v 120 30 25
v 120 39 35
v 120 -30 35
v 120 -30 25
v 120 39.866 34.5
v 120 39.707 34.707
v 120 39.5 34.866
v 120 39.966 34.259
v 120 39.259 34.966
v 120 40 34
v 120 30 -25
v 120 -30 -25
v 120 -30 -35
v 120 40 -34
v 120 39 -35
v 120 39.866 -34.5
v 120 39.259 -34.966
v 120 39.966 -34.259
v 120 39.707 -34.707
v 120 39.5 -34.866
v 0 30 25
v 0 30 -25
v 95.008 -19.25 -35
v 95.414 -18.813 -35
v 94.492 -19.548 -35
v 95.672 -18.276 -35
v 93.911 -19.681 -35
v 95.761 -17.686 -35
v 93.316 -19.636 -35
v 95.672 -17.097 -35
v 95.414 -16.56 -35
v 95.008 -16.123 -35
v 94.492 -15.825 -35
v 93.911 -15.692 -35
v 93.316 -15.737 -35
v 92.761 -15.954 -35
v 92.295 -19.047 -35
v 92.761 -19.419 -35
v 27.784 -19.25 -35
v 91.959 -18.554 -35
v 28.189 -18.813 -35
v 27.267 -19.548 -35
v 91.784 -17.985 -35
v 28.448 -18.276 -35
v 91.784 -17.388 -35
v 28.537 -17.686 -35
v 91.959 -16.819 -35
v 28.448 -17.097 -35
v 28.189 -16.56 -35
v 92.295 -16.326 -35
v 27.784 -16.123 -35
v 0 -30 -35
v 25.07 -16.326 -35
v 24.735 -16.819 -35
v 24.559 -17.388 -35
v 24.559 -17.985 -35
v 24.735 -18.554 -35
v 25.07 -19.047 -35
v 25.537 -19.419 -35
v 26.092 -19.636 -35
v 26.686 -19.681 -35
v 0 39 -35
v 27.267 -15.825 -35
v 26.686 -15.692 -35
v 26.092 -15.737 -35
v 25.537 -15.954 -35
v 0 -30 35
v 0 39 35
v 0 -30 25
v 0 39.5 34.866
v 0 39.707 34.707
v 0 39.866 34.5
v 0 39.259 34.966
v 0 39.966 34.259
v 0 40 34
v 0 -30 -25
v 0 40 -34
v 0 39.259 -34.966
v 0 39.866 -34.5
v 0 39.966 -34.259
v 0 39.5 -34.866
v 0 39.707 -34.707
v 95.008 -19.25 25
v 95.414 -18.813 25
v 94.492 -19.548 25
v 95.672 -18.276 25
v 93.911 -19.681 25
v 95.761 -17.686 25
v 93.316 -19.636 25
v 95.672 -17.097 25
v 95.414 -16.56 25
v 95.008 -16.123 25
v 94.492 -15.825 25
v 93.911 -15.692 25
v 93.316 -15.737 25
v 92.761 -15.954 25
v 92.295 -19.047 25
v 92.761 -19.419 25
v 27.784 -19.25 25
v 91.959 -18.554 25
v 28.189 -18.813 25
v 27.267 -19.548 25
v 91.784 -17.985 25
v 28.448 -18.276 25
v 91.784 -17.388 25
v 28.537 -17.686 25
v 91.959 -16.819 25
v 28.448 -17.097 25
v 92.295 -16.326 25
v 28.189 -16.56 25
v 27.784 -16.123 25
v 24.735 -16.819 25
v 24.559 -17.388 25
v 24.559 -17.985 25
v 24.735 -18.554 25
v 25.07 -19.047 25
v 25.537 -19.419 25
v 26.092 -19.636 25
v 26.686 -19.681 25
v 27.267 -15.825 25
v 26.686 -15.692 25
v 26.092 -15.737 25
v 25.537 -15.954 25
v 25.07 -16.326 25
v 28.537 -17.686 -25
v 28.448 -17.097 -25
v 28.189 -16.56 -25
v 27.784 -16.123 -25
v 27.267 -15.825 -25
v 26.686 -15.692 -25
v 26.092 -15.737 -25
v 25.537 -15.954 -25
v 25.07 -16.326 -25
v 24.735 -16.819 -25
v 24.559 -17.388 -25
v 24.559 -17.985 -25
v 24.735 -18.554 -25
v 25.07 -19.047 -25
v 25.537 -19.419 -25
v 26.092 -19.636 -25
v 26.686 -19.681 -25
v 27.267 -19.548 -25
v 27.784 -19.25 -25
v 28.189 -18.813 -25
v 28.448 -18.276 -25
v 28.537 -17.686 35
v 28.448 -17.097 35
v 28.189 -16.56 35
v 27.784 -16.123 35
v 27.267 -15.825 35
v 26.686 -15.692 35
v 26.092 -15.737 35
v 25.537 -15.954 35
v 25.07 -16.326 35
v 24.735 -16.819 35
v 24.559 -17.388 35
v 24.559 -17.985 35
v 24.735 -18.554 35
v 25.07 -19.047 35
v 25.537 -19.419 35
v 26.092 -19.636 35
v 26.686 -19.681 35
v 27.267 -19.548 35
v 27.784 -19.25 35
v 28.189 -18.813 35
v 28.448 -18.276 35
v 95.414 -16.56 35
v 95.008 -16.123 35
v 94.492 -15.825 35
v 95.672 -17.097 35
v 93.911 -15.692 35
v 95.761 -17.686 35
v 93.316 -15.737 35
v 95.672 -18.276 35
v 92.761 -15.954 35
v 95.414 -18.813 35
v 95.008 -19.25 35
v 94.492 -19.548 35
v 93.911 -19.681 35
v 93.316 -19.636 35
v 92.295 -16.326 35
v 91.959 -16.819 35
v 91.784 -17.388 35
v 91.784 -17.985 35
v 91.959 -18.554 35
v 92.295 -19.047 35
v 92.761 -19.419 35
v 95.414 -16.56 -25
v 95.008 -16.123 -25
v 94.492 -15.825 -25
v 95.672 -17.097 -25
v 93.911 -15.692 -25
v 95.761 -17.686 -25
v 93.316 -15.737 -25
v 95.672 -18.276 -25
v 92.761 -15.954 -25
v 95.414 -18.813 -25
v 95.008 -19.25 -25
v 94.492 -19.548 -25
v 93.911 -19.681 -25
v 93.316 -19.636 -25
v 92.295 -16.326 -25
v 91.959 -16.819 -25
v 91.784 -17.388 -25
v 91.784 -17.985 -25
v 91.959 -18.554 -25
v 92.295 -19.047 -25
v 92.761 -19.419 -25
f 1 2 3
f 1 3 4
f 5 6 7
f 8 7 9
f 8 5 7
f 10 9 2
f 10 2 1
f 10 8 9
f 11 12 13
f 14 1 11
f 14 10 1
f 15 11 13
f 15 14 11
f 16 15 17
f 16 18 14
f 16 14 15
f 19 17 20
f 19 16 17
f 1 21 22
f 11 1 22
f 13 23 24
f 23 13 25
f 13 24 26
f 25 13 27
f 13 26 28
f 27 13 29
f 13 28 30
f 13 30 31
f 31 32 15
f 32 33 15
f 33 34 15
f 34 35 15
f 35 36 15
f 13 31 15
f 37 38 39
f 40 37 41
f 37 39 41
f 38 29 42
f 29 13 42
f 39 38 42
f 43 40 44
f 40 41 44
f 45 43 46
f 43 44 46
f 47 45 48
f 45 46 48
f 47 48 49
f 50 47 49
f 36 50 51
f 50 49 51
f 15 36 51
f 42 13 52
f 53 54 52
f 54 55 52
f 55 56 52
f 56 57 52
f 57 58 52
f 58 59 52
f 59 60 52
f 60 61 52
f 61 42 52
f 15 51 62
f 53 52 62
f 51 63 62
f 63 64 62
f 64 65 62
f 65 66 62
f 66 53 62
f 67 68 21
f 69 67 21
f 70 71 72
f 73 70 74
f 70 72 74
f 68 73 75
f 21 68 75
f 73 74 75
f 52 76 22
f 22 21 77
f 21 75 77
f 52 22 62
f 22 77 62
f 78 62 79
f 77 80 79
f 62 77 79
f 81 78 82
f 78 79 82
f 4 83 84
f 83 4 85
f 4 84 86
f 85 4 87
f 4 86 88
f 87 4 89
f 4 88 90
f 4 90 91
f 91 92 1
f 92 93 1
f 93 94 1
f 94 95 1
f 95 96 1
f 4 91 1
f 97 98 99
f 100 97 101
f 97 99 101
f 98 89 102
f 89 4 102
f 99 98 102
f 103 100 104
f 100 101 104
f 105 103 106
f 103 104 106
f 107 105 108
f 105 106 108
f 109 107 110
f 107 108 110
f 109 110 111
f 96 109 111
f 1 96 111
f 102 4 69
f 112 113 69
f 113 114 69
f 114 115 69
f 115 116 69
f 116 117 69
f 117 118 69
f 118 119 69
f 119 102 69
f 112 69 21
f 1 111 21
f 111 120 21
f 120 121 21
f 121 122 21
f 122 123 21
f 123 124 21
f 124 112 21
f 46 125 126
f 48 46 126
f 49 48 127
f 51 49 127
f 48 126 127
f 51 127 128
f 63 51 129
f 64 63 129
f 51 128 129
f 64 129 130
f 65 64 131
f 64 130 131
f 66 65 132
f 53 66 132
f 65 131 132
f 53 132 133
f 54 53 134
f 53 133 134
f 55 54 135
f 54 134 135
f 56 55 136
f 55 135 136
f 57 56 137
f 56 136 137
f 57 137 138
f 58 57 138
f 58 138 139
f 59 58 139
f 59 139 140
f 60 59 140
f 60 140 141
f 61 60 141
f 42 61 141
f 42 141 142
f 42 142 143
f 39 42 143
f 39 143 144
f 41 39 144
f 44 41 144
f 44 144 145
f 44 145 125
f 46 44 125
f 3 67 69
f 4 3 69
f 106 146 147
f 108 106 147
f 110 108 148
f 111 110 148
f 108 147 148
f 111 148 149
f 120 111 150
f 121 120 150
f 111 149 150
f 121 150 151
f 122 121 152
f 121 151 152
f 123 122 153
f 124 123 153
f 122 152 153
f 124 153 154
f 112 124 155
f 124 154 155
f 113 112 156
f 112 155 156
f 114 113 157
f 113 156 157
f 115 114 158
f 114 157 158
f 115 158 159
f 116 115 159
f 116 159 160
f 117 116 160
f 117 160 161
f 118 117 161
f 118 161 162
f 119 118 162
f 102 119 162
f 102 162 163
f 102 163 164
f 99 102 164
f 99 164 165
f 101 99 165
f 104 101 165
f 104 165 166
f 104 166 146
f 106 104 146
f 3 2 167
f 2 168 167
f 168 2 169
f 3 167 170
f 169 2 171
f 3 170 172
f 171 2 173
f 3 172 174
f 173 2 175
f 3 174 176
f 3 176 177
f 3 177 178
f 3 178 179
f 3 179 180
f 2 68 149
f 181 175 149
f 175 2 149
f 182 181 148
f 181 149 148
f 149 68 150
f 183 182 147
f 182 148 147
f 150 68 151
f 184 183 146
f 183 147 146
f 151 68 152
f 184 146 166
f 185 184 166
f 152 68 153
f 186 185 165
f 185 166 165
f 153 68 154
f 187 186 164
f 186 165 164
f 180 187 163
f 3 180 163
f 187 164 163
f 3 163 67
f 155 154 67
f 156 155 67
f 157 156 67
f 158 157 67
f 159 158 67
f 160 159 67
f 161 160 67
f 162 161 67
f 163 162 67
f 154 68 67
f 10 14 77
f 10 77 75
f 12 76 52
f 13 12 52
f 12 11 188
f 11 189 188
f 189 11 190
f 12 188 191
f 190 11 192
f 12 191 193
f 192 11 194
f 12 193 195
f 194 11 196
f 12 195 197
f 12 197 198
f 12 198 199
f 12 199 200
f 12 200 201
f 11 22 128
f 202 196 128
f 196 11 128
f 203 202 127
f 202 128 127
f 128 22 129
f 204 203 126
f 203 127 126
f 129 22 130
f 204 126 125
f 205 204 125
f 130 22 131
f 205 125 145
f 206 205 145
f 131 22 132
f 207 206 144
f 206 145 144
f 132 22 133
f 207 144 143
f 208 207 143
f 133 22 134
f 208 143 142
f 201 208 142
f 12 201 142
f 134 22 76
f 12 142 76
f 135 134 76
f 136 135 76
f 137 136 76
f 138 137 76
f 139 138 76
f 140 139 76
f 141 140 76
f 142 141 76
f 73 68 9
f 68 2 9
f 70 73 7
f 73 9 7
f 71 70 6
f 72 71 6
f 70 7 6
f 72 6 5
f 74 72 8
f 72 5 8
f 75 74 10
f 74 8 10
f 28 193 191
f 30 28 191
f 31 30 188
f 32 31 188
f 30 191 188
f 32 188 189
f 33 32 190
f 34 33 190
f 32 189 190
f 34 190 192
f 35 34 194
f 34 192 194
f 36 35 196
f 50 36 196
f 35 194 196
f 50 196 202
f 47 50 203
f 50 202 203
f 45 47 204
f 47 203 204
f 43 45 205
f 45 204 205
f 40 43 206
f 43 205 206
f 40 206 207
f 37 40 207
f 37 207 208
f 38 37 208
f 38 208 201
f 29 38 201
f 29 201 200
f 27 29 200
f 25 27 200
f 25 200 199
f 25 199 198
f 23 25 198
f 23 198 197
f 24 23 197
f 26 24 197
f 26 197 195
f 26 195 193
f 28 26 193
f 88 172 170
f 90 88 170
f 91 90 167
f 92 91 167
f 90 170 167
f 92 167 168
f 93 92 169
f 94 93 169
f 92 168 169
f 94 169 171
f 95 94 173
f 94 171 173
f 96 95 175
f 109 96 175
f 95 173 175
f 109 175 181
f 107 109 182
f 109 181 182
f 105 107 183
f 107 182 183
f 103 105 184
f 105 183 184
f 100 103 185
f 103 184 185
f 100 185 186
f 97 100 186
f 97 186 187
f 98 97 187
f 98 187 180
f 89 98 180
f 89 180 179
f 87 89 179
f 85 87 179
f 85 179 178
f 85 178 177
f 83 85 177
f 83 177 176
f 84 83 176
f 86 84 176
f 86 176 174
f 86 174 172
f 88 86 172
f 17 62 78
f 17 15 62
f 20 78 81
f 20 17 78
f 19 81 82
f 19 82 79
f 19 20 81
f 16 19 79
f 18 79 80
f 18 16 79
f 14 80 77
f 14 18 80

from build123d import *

# Parameters (mm, degrees)
EXTRUDE_THIN1_DEPTH = 120
SKETCH5_R           = 2
CUT_EXTRUDE1_DEPTH  = 145.568322948
FILLET1_R           = 1


with BuildPart() as part:
    # Sketch3 → Extrude-Thin1 (new body)
    with BuildSketch(Plane(origin=(0, 0, 0), x_dir=(0, 0, -1), z_dir=(1, 0, 0))):
        Polygon((-25, -30), (-25, 30), (25, 30), (25, -30), (35, -30), (35, 40), (-35, 40), (-35, -30), align=None)
    extrude(amount=EXTRUDE_THIN1_DEPTH)

    # Sketch5 → Cut-Extrude1 (cut, through all)
    with BuildSketch(Plane.XY.offset(35)):
        with Locations((26.536588231, -17.686450881)):
            Circle(SKETCH5_R)
        with Locations((93.76132228, -17.686450881)):
            Circle(SKETCH5_R)
    extrude(amount=-CUT_EXTRUDE1_DEPTH, mode=Mode.SUBTRACT)

    # Fillet1
    fillet1_edges = [part.edges().sort_by_distance(p)[0] for p in [
        (60, 40, 35),
        (60, 40, -35),
    ]]
    fillet(fillet1_edges, radius=FILLET1_R)


solid = part.part
